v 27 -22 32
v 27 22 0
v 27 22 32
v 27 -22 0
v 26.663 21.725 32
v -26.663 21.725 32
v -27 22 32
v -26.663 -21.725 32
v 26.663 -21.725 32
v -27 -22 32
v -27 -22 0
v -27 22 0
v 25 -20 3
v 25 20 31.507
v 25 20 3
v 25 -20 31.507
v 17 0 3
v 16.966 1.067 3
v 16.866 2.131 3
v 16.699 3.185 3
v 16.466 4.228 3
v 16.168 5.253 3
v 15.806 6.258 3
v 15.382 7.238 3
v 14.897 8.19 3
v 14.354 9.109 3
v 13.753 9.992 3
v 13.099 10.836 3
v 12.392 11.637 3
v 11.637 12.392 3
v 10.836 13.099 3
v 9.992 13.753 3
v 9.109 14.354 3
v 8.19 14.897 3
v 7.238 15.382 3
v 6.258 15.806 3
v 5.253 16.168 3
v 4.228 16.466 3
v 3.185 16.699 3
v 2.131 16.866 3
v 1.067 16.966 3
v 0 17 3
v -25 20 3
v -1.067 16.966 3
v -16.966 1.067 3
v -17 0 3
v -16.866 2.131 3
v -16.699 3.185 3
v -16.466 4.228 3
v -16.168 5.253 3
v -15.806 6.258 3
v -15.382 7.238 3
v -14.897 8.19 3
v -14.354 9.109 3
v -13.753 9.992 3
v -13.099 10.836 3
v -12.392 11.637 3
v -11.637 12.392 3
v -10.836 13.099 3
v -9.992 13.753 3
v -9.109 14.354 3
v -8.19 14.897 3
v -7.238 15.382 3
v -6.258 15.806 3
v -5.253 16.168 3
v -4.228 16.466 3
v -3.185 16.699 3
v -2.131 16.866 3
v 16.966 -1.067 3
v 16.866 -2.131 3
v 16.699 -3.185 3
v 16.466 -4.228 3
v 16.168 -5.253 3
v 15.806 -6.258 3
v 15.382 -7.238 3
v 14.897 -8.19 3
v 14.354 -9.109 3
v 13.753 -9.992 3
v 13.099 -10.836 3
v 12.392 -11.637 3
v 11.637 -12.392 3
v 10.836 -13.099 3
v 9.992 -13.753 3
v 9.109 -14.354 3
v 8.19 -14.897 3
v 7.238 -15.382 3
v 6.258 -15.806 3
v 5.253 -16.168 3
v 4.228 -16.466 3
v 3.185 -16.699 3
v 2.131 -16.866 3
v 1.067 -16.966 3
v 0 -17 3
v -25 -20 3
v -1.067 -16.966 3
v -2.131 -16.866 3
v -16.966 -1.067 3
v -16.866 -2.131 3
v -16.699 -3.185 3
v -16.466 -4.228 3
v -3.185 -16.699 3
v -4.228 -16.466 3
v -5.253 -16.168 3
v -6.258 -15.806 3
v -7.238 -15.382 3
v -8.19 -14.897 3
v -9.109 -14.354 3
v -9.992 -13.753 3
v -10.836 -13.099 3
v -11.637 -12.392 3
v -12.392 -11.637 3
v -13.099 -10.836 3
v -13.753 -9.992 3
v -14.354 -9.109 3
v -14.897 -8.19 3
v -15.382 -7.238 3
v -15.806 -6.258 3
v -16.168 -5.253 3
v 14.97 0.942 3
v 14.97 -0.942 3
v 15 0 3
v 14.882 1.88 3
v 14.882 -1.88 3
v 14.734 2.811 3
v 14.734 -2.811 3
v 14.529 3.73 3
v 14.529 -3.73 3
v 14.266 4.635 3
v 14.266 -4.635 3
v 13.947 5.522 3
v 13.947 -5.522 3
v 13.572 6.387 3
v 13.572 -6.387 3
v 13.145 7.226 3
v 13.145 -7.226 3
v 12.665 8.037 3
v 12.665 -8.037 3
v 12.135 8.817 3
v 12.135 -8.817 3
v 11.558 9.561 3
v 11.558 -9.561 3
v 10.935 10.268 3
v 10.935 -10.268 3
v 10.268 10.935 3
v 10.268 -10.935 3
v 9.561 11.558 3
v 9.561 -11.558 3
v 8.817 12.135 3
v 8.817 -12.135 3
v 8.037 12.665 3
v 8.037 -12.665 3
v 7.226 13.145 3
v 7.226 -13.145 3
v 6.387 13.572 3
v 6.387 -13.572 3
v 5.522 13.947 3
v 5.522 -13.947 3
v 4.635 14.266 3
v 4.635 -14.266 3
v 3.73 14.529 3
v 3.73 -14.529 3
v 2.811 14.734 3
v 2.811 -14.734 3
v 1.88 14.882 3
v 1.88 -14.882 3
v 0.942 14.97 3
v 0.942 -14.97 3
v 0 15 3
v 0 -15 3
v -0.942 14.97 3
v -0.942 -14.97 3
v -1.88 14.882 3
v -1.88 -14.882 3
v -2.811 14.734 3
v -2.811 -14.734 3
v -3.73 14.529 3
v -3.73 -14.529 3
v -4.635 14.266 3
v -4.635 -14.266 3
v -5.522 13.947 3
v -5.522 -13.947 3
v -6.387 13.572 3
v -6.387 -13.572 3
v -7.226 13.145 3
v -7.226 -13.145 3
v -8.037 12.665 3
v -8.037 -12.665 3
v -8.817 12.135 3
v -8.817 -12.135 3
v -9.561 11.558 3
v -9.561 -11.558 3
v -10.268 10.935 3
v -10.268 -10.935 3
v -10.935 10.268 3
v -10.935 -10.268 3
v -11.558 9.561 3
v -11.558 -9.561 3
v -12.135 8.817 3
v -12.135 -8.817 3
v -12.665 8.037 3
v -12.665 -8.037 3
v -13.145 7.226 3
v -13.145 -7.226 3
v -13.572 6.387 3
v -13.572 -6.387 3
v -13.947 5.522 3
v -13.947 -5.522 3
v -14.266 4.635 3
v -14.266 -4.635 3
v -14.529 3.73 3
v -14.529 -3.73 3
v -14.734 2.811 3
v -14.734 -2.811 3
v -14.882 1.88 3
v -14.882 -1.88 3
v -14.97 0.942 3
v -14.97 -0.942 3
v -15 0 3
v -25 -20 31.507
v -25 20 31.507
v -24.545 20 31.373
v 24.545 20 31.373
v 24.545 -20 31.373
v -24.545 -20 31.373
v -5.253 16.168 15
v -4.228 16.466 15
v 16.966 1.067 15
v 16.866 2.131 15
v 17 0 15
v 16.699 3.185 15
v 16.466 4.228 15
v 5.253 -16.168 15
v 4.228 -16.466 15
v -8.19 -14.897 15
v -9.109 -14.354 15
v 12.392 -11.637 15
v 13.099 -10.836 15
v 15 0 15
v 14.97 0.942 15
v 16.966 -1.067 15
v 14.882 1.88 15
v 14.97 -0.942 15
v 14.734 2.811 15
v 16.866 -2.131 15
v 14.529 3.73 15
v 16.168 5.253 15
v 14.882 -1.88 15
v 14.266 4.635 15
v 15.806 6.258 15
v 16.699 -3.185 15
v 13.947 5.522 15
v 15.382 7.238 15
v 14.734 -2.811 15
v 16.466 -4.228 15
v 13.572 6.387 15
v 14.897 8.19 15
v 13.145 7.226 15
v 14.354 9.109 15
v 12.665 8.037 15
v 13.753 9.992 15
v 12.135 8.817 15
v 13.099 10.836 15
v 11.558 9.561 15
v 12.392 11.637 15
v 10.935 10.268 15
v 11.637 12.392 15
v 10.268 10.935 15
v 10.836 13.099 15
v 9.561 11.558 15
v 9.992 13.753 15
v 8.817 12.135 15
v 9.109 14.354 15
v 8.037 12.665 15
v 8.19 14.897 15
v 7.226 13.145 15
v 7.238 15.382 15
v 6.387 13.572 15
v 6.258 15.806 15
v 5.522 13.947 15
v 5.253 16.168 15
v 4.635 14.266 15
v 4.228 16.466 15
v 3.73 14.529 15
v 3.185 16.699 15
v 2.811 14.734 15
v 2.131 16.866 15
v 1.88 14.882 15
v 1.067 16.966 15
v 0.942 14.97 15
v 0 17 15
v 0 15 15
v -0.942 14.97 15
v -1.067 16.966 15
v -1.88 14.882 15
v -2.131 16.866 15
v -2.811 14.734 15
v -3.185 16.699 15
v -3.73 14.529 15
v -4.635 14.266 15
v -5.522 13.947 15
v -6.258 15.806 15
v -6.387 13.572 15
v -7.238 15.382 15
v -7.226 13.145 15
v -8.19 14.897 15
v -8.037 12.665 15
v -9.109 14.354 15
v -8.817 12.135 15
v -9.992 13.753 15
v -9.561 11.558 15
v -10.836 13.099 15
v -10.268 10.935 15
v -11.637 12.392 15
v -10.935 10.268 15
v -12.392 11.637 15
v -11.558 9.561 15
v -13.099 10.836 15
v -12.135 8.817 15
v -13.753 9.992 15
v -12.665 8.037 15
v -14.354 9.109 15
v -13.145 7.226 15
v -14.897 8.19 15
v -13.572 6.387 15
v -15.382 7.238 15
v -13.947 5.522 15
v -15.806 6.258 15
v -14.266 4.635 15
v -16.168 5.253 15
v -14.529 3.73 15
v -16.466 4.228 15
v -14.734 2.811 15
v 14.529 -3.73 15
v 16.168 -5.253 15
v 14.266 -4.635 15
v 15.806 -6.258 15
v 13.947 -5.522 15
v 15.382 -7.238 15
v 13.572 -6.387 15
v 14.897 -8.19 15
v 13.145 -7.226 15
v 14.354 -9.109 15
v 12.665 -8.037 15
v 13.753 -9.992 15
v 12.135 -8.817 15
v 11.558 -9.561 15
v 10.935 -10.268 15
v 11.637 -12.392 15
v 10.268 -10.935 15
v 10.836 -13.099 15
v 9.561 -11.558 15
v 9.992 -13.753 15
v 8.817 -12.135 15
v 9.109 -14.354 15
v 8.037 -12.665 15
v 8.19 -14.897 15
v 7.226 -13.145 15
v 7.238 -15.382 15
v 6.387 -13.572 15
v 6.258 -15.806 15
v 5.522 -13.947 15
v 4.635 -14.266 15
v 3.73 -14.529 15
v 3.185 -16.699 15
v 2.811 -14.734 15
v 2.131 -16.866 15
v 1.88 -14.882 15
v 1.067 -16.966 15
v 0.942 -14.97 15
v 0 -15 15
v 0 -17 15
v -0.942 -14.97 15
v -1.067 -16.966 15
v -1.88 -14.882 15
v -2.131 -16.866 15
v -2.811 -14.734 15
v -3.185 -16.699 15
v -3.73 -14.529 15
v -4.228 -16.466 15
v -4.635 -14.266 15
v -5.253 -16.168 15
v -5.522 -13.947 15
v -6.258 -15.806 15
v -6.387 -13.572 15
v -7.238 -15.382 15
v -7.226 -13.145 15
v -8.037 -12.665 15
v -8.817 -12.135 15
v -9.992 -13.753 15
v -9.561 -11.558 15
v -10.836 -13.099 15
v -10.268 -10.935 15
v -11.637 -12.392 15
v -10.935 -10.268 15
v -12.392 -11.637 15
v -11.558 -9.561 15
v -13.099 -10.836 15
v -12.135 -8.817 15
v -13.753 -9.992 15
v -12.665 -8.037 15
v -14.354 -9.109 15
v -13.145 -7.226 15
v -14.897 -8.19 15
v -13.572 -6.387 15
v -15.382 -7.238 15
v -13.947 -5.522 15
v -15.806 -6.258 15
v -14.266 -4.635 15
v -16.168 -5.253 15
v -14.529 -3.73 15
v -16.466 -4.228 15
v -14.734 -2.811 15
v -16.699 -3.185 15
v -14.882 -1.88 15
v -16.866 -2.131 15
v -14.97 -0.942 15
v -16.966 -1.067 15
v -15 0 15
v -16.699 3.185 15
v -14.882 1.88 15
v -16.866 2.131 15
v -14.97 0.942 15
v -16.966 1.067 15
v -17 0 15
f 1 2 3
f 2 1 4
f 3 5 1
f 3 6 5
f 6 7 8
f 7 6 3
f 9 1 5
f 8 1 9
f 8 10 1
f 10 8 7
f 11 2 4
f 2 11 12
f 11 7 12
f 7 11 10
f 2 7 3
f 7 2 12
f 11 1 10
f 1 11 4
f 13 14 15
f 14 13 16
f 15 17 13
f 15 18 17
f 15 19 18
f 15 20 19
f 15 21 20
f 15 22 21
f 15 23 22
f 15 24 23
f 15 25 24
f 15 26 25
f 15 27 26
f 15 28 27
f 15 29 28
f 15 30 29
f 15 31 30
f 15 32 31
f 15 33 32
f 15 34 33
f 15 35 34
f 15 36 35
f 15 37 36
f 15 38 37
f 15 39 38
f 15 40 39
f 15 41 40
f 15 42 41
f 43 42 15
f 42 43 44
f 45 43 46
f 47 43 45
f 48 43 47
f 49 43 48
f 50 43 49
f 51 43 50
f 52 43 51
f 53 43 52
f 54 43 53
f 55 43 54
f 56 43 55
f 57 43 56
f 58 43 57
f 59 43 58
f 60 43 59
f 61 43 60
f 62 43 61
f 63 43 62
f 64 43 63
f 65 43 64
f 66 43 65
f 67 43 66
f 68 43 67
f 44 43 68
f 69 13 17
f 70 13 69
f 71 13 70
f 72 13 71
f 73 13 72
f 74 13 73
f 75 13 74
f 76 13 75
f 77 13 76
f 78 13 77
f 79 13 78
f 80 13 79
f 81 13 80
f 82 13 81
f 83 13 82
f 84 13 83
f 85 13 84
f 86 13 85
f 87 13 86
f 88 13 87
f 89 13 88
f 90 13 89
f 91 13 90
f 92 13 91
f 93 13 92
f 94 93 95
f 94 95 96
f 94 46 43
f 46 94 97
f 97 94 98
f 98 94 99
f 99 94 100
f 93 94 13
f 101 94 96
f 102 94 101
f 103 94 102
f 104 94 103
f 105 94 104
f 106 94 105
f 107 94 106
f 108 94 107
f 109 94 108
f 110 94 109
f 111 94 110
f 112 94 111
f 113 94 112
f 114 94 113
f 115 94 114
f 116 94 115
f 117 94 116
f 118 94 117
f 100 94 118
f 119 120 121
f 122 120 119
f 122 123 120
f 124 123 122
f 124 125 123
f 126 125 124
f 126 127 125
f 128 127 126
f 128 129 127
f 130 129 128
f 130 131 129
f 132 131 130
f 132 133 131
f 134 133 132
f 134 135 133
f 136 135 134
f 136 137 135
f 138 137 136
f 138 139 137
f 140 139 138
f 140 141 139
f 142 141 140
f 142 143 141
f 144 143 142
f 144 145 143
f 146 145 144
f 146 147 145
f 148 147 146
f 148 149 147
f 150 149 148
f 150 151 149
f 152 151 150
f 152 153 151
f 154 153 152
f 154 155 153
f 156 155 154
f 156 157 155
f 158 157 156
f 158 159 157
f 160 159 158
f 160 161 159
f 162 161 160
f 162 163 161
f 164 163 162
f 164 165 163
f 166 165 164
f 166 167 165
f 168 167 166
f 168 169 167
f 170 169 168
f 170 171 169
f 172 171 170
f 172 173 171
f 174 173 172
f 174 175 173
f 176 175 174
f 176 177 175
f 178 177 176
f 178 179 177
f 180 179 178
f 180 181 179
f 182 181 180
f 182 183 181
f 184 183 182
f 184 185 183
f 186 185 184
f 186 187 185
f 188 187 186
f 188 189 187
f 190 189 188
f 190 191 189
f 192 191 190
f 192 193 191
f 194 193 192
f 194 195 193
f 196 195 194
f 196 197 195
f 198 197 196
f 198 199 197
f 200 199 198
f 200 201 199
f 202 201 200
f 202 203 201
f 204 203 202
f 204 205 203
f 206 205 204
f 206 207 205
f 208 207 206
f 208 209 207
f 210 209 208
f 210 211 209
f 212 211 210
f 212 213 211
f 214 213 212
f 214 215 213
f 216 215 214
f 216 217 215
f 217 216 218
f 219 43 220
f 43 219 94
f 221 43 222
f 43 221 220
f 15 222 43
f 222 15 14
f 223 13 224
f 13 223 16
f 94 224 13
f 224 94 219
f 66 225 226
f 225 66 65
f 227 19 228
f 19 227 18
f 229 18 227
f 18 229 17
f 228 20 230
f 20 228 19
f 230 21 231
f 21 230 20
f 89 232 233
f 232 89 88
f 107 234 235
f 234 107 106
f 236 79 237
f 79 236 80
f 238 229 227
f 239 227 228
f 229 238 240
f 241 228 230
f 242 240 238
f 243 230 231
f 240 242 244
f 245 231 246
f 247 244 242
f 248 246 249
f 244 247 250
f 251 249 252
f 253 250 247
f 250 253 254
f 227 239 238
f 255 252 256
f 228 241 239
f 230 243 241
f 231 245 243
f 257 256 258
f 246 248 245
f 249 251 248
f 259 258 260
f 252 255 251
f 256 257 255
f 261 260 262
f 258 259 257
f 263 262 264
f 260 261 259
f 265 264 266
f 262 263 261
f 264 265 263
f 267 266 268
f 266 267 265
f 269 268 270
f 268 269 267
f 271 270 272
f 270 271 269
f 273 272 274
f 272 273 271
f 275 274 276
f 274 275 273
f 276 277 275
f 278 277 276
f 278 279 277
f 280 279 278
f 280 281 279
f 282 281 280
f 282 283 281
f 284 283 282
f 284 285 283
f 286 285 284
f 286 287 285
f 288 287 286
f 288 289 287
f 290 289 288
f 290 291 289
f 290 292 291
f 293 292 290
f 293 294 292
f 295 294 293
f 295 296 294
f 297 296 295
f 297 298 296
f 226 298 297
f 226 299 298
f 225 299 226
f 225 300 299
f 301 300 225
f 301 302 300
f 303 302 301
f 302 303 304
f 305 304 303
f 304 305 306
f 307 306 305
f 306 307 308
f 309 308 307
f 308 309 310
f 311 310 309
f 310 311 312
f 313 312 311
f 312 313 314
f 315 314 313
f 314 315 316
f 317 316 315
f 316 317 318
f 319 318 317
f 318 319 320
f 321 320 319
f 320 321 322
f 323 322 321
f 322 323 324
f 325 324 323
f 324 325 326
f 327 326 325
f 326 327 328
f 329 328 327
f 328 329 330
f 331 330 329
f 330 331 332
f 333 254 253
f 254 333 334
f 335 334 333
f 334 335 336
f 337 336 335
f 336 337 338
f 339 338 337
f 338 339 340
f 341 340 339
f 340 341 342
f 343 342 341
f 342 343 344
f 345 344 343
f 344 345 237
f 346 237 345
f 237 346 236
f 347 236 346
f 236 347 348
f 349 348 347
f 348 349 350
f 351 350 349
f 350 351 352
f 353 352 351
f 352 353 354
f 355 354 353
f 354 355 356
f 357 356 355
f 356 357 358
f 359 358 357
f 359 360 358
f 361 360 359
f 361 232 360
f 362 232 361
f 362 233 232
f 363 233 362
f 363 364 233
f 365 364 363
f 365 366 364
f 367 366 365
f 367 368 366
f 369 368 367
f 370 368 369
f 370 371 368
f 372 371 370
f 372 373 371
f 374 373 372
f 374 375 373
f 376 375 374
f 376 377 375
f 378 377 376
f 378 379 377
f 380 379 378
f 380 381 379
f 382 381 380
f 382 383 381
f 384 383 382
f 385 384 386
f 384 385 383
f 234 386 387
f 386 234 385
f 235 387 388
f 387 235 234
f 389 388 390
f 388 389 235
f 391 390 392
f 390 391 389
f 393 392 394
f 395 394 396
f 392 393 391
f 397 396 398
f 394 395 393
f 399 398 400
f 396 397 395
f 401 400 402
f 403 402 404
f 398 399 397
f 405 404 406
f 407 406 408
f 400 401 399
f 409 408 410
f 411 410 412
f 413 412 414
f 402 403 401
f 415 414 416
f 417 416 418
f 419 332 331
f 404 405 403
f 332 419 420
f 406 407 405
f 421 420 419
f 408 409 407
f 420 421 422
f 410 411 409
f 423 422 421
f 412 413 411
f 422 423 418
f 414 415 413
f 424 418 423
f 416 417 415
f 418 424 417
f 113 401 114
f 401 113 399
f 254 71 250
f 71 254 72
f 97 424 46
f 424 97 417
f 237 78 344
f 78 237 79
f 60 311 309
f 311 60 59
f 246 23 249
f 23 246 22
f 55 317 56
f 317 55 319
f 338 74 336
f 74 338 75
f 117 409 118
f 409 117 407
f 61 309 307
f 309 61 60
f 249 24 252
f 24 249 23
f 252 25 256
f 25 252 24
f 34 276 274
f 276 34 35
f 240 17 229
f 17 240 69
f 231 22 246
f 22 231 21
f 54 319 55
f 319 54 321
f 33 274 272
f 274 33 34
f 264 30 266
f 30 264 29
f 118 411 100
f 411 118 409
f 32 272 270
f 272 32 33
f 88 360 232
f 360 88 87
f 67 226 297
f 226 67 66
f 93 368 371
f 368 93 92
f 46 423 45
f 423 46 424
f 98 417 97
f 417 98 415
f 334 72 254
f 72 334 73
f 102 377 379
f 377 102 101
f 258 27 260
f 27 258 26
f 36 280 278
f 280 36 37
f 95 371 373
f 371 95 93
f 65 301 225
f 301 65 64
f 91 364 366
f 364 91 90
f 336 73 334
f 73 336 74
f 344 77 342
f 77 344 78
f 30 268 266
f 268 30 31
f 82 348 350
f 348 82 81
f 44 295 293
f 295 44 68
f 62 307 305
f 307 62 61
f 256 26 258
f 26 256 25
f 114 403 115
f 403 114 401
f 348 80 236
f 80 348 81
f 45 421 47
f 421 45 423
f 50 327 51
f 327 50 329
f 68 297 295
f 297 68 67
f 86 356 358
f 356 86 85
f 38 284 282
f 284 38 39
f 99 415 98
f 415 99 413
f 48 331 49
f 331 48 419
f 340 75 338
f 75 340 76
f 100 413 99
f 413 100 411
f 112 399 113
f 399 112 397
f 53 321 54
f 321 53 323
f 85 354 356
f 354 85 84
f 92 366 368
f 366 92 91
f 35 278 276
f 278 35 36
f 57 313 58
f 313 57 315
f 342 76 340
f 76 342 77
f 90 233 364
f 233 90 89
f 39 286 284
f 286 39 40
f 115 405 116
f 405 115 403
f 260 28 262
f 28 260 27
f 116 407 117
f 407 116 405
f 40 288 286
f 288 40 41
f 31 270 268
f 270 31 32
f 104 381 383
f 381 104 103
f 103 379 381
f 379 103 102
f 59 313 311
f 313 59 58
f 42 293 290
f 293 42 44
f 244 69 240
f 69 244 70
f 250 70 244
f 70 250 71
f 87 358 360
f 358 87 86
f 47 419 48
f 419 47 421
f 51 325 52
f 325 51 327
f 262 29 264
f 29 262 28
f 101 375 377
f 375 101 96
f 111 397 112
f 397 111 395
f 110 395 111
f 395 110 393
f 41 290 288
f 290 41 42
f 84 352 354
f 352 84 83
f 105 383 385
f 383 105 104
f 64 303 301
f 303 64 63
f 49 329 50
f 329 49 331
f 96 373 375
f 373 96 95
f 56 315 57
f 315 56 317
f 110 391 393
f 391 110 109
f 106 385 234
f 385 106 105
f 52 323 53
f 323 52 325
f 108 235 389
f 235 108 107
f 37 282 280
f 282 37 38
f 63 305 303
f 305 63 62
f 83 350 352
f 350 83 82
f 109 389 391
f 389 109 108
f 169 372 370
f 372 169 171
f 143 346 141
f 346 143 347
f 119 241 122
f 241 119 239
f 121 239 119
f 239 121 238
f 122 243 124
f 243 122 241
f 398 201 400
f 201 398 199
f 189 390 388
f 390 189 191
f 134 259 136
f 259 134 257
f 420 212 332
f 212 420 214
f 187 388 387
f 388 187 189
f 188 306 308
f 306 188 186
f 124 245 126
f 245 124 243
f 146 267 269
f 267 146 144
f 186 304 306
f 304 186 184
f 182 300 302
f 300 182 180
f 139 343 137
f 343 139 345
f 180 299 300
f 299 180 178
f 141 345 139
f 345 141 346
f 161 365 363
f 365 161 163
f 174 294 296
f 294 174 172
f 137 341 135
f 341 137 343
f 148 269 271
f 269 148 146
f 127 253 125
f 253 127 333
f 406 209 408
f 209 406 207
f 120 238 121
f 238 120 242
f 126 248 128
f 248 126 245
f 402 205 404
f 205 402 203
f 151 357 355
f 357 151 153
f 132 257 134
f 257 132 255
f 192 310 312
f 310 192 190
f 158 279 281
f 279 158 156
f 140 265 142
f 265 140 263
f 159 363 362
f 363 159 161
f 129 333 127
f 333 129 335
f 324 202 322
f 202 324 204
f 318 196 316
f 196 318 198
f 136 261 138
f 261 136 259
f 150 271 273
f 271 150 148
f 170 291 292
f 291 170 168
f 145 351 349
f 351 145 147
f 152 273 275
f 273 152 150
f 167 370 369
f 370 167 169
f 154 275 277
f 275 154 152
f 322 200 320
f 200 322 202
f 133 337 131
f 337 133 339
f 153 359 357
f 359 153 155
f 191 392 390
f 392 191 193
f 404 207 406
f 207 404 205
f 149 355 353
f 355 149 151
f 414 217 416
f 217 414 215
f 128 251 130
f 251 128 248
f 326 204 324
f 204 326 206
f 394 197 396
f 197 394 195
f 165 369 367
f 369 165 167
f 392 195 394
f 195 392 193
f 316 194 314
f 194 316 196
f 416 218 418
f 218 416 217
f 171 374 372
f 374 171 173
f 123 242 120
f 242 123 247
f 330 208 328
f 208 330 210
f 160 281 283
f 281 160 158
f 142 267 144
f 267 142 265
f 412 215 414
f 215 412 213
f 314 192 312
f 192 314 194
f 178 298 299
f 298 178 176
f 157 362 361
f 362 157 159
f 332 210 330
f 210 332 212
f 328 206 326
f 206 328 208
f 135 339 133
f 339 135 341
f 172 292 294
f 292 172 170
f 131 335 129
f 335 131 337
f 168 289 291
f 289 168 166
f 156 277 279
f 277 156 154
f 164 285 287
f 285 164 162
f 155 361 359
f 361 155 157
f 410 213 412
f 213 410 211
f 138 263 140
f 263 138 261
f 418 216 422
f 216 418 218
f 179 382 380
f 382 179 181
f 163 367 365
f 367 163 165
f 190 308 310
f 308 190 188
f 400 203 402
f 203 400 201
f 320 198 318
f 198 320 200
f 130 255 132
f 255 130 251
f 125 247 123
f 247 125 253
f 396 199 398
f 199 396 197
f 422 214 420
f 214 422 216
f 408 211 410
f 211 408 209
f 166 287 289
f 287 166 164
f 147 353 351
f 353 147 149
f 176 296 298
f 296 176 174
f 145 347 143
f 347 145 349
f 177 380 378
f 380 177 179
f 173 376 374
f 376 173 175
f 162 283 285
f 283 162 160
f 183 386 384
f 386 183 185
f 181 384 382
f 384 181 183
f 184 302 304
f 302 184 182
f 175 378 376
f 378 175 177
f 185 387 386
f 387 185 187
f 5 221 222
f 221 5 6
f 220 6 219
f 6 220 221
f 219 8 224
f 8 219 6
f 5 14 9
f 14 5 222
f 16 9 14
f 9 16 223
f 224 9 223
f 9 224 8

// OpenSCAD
// Diameter of the container's cap
capdia=30;

// Height of the container's cap
capheight=13;

// Width of the post
postwidth=40;

// Lenghth of the post
postlength=50;

// Elements height
elementheight=30;

// Wall strength
wall=2;


capradius=(capdia/2);
widthhalf=((postwidth/2)+(2*wall));
lengthhalf=((postlength/2)+(2*wall));

// Checks
if (capheight > elementheight)
{
    echo ("Capheight higher than elementheight. Please change it.");
}
else
{
    if ((capdia+(2*wall)) >= postlength)
    {
        echo ("Inner radius higher than post length... Please check");
    } else
    {
        if ((capdia+(2*wall)) >= postwidth)
        {
            echo ("Inner radius higher than post width... Please check");
        } else
        {
            
           difference(){
                union(){
                    difference(){
                        translate([0, 0, (elementheight/2)+(wall/2)])
                        cube(size=[(postlength+(2*wall)),(postwidth+(2*wall)),(elementheight+wall)], center = true);
                        translate([0, 0, ((elementheight/2)+(wall/2)+wall)])
                        cube(size=[postlength,postwidth,elementheight], center = true);
                        };

                   difference(){
                        translate([0, 0, wall])
                        cylinder(h=(capheight),r=(capradius+wall), $fn = 100);
                        translate([0, 0, wall])
                        cylinder(h=(capheight+0.1),r=capradius, $fn = 100);
                        };
                    };
                //
               translate([0, 0, (elementheight-wall)+0.1])
                linear_extrude(height=(wall*2), scale =2/1) square([((postlength+(2*wall))/2),((postwidth+(2*wall))/2)], center=true);
                
                };
                
           
            };
        };
}
